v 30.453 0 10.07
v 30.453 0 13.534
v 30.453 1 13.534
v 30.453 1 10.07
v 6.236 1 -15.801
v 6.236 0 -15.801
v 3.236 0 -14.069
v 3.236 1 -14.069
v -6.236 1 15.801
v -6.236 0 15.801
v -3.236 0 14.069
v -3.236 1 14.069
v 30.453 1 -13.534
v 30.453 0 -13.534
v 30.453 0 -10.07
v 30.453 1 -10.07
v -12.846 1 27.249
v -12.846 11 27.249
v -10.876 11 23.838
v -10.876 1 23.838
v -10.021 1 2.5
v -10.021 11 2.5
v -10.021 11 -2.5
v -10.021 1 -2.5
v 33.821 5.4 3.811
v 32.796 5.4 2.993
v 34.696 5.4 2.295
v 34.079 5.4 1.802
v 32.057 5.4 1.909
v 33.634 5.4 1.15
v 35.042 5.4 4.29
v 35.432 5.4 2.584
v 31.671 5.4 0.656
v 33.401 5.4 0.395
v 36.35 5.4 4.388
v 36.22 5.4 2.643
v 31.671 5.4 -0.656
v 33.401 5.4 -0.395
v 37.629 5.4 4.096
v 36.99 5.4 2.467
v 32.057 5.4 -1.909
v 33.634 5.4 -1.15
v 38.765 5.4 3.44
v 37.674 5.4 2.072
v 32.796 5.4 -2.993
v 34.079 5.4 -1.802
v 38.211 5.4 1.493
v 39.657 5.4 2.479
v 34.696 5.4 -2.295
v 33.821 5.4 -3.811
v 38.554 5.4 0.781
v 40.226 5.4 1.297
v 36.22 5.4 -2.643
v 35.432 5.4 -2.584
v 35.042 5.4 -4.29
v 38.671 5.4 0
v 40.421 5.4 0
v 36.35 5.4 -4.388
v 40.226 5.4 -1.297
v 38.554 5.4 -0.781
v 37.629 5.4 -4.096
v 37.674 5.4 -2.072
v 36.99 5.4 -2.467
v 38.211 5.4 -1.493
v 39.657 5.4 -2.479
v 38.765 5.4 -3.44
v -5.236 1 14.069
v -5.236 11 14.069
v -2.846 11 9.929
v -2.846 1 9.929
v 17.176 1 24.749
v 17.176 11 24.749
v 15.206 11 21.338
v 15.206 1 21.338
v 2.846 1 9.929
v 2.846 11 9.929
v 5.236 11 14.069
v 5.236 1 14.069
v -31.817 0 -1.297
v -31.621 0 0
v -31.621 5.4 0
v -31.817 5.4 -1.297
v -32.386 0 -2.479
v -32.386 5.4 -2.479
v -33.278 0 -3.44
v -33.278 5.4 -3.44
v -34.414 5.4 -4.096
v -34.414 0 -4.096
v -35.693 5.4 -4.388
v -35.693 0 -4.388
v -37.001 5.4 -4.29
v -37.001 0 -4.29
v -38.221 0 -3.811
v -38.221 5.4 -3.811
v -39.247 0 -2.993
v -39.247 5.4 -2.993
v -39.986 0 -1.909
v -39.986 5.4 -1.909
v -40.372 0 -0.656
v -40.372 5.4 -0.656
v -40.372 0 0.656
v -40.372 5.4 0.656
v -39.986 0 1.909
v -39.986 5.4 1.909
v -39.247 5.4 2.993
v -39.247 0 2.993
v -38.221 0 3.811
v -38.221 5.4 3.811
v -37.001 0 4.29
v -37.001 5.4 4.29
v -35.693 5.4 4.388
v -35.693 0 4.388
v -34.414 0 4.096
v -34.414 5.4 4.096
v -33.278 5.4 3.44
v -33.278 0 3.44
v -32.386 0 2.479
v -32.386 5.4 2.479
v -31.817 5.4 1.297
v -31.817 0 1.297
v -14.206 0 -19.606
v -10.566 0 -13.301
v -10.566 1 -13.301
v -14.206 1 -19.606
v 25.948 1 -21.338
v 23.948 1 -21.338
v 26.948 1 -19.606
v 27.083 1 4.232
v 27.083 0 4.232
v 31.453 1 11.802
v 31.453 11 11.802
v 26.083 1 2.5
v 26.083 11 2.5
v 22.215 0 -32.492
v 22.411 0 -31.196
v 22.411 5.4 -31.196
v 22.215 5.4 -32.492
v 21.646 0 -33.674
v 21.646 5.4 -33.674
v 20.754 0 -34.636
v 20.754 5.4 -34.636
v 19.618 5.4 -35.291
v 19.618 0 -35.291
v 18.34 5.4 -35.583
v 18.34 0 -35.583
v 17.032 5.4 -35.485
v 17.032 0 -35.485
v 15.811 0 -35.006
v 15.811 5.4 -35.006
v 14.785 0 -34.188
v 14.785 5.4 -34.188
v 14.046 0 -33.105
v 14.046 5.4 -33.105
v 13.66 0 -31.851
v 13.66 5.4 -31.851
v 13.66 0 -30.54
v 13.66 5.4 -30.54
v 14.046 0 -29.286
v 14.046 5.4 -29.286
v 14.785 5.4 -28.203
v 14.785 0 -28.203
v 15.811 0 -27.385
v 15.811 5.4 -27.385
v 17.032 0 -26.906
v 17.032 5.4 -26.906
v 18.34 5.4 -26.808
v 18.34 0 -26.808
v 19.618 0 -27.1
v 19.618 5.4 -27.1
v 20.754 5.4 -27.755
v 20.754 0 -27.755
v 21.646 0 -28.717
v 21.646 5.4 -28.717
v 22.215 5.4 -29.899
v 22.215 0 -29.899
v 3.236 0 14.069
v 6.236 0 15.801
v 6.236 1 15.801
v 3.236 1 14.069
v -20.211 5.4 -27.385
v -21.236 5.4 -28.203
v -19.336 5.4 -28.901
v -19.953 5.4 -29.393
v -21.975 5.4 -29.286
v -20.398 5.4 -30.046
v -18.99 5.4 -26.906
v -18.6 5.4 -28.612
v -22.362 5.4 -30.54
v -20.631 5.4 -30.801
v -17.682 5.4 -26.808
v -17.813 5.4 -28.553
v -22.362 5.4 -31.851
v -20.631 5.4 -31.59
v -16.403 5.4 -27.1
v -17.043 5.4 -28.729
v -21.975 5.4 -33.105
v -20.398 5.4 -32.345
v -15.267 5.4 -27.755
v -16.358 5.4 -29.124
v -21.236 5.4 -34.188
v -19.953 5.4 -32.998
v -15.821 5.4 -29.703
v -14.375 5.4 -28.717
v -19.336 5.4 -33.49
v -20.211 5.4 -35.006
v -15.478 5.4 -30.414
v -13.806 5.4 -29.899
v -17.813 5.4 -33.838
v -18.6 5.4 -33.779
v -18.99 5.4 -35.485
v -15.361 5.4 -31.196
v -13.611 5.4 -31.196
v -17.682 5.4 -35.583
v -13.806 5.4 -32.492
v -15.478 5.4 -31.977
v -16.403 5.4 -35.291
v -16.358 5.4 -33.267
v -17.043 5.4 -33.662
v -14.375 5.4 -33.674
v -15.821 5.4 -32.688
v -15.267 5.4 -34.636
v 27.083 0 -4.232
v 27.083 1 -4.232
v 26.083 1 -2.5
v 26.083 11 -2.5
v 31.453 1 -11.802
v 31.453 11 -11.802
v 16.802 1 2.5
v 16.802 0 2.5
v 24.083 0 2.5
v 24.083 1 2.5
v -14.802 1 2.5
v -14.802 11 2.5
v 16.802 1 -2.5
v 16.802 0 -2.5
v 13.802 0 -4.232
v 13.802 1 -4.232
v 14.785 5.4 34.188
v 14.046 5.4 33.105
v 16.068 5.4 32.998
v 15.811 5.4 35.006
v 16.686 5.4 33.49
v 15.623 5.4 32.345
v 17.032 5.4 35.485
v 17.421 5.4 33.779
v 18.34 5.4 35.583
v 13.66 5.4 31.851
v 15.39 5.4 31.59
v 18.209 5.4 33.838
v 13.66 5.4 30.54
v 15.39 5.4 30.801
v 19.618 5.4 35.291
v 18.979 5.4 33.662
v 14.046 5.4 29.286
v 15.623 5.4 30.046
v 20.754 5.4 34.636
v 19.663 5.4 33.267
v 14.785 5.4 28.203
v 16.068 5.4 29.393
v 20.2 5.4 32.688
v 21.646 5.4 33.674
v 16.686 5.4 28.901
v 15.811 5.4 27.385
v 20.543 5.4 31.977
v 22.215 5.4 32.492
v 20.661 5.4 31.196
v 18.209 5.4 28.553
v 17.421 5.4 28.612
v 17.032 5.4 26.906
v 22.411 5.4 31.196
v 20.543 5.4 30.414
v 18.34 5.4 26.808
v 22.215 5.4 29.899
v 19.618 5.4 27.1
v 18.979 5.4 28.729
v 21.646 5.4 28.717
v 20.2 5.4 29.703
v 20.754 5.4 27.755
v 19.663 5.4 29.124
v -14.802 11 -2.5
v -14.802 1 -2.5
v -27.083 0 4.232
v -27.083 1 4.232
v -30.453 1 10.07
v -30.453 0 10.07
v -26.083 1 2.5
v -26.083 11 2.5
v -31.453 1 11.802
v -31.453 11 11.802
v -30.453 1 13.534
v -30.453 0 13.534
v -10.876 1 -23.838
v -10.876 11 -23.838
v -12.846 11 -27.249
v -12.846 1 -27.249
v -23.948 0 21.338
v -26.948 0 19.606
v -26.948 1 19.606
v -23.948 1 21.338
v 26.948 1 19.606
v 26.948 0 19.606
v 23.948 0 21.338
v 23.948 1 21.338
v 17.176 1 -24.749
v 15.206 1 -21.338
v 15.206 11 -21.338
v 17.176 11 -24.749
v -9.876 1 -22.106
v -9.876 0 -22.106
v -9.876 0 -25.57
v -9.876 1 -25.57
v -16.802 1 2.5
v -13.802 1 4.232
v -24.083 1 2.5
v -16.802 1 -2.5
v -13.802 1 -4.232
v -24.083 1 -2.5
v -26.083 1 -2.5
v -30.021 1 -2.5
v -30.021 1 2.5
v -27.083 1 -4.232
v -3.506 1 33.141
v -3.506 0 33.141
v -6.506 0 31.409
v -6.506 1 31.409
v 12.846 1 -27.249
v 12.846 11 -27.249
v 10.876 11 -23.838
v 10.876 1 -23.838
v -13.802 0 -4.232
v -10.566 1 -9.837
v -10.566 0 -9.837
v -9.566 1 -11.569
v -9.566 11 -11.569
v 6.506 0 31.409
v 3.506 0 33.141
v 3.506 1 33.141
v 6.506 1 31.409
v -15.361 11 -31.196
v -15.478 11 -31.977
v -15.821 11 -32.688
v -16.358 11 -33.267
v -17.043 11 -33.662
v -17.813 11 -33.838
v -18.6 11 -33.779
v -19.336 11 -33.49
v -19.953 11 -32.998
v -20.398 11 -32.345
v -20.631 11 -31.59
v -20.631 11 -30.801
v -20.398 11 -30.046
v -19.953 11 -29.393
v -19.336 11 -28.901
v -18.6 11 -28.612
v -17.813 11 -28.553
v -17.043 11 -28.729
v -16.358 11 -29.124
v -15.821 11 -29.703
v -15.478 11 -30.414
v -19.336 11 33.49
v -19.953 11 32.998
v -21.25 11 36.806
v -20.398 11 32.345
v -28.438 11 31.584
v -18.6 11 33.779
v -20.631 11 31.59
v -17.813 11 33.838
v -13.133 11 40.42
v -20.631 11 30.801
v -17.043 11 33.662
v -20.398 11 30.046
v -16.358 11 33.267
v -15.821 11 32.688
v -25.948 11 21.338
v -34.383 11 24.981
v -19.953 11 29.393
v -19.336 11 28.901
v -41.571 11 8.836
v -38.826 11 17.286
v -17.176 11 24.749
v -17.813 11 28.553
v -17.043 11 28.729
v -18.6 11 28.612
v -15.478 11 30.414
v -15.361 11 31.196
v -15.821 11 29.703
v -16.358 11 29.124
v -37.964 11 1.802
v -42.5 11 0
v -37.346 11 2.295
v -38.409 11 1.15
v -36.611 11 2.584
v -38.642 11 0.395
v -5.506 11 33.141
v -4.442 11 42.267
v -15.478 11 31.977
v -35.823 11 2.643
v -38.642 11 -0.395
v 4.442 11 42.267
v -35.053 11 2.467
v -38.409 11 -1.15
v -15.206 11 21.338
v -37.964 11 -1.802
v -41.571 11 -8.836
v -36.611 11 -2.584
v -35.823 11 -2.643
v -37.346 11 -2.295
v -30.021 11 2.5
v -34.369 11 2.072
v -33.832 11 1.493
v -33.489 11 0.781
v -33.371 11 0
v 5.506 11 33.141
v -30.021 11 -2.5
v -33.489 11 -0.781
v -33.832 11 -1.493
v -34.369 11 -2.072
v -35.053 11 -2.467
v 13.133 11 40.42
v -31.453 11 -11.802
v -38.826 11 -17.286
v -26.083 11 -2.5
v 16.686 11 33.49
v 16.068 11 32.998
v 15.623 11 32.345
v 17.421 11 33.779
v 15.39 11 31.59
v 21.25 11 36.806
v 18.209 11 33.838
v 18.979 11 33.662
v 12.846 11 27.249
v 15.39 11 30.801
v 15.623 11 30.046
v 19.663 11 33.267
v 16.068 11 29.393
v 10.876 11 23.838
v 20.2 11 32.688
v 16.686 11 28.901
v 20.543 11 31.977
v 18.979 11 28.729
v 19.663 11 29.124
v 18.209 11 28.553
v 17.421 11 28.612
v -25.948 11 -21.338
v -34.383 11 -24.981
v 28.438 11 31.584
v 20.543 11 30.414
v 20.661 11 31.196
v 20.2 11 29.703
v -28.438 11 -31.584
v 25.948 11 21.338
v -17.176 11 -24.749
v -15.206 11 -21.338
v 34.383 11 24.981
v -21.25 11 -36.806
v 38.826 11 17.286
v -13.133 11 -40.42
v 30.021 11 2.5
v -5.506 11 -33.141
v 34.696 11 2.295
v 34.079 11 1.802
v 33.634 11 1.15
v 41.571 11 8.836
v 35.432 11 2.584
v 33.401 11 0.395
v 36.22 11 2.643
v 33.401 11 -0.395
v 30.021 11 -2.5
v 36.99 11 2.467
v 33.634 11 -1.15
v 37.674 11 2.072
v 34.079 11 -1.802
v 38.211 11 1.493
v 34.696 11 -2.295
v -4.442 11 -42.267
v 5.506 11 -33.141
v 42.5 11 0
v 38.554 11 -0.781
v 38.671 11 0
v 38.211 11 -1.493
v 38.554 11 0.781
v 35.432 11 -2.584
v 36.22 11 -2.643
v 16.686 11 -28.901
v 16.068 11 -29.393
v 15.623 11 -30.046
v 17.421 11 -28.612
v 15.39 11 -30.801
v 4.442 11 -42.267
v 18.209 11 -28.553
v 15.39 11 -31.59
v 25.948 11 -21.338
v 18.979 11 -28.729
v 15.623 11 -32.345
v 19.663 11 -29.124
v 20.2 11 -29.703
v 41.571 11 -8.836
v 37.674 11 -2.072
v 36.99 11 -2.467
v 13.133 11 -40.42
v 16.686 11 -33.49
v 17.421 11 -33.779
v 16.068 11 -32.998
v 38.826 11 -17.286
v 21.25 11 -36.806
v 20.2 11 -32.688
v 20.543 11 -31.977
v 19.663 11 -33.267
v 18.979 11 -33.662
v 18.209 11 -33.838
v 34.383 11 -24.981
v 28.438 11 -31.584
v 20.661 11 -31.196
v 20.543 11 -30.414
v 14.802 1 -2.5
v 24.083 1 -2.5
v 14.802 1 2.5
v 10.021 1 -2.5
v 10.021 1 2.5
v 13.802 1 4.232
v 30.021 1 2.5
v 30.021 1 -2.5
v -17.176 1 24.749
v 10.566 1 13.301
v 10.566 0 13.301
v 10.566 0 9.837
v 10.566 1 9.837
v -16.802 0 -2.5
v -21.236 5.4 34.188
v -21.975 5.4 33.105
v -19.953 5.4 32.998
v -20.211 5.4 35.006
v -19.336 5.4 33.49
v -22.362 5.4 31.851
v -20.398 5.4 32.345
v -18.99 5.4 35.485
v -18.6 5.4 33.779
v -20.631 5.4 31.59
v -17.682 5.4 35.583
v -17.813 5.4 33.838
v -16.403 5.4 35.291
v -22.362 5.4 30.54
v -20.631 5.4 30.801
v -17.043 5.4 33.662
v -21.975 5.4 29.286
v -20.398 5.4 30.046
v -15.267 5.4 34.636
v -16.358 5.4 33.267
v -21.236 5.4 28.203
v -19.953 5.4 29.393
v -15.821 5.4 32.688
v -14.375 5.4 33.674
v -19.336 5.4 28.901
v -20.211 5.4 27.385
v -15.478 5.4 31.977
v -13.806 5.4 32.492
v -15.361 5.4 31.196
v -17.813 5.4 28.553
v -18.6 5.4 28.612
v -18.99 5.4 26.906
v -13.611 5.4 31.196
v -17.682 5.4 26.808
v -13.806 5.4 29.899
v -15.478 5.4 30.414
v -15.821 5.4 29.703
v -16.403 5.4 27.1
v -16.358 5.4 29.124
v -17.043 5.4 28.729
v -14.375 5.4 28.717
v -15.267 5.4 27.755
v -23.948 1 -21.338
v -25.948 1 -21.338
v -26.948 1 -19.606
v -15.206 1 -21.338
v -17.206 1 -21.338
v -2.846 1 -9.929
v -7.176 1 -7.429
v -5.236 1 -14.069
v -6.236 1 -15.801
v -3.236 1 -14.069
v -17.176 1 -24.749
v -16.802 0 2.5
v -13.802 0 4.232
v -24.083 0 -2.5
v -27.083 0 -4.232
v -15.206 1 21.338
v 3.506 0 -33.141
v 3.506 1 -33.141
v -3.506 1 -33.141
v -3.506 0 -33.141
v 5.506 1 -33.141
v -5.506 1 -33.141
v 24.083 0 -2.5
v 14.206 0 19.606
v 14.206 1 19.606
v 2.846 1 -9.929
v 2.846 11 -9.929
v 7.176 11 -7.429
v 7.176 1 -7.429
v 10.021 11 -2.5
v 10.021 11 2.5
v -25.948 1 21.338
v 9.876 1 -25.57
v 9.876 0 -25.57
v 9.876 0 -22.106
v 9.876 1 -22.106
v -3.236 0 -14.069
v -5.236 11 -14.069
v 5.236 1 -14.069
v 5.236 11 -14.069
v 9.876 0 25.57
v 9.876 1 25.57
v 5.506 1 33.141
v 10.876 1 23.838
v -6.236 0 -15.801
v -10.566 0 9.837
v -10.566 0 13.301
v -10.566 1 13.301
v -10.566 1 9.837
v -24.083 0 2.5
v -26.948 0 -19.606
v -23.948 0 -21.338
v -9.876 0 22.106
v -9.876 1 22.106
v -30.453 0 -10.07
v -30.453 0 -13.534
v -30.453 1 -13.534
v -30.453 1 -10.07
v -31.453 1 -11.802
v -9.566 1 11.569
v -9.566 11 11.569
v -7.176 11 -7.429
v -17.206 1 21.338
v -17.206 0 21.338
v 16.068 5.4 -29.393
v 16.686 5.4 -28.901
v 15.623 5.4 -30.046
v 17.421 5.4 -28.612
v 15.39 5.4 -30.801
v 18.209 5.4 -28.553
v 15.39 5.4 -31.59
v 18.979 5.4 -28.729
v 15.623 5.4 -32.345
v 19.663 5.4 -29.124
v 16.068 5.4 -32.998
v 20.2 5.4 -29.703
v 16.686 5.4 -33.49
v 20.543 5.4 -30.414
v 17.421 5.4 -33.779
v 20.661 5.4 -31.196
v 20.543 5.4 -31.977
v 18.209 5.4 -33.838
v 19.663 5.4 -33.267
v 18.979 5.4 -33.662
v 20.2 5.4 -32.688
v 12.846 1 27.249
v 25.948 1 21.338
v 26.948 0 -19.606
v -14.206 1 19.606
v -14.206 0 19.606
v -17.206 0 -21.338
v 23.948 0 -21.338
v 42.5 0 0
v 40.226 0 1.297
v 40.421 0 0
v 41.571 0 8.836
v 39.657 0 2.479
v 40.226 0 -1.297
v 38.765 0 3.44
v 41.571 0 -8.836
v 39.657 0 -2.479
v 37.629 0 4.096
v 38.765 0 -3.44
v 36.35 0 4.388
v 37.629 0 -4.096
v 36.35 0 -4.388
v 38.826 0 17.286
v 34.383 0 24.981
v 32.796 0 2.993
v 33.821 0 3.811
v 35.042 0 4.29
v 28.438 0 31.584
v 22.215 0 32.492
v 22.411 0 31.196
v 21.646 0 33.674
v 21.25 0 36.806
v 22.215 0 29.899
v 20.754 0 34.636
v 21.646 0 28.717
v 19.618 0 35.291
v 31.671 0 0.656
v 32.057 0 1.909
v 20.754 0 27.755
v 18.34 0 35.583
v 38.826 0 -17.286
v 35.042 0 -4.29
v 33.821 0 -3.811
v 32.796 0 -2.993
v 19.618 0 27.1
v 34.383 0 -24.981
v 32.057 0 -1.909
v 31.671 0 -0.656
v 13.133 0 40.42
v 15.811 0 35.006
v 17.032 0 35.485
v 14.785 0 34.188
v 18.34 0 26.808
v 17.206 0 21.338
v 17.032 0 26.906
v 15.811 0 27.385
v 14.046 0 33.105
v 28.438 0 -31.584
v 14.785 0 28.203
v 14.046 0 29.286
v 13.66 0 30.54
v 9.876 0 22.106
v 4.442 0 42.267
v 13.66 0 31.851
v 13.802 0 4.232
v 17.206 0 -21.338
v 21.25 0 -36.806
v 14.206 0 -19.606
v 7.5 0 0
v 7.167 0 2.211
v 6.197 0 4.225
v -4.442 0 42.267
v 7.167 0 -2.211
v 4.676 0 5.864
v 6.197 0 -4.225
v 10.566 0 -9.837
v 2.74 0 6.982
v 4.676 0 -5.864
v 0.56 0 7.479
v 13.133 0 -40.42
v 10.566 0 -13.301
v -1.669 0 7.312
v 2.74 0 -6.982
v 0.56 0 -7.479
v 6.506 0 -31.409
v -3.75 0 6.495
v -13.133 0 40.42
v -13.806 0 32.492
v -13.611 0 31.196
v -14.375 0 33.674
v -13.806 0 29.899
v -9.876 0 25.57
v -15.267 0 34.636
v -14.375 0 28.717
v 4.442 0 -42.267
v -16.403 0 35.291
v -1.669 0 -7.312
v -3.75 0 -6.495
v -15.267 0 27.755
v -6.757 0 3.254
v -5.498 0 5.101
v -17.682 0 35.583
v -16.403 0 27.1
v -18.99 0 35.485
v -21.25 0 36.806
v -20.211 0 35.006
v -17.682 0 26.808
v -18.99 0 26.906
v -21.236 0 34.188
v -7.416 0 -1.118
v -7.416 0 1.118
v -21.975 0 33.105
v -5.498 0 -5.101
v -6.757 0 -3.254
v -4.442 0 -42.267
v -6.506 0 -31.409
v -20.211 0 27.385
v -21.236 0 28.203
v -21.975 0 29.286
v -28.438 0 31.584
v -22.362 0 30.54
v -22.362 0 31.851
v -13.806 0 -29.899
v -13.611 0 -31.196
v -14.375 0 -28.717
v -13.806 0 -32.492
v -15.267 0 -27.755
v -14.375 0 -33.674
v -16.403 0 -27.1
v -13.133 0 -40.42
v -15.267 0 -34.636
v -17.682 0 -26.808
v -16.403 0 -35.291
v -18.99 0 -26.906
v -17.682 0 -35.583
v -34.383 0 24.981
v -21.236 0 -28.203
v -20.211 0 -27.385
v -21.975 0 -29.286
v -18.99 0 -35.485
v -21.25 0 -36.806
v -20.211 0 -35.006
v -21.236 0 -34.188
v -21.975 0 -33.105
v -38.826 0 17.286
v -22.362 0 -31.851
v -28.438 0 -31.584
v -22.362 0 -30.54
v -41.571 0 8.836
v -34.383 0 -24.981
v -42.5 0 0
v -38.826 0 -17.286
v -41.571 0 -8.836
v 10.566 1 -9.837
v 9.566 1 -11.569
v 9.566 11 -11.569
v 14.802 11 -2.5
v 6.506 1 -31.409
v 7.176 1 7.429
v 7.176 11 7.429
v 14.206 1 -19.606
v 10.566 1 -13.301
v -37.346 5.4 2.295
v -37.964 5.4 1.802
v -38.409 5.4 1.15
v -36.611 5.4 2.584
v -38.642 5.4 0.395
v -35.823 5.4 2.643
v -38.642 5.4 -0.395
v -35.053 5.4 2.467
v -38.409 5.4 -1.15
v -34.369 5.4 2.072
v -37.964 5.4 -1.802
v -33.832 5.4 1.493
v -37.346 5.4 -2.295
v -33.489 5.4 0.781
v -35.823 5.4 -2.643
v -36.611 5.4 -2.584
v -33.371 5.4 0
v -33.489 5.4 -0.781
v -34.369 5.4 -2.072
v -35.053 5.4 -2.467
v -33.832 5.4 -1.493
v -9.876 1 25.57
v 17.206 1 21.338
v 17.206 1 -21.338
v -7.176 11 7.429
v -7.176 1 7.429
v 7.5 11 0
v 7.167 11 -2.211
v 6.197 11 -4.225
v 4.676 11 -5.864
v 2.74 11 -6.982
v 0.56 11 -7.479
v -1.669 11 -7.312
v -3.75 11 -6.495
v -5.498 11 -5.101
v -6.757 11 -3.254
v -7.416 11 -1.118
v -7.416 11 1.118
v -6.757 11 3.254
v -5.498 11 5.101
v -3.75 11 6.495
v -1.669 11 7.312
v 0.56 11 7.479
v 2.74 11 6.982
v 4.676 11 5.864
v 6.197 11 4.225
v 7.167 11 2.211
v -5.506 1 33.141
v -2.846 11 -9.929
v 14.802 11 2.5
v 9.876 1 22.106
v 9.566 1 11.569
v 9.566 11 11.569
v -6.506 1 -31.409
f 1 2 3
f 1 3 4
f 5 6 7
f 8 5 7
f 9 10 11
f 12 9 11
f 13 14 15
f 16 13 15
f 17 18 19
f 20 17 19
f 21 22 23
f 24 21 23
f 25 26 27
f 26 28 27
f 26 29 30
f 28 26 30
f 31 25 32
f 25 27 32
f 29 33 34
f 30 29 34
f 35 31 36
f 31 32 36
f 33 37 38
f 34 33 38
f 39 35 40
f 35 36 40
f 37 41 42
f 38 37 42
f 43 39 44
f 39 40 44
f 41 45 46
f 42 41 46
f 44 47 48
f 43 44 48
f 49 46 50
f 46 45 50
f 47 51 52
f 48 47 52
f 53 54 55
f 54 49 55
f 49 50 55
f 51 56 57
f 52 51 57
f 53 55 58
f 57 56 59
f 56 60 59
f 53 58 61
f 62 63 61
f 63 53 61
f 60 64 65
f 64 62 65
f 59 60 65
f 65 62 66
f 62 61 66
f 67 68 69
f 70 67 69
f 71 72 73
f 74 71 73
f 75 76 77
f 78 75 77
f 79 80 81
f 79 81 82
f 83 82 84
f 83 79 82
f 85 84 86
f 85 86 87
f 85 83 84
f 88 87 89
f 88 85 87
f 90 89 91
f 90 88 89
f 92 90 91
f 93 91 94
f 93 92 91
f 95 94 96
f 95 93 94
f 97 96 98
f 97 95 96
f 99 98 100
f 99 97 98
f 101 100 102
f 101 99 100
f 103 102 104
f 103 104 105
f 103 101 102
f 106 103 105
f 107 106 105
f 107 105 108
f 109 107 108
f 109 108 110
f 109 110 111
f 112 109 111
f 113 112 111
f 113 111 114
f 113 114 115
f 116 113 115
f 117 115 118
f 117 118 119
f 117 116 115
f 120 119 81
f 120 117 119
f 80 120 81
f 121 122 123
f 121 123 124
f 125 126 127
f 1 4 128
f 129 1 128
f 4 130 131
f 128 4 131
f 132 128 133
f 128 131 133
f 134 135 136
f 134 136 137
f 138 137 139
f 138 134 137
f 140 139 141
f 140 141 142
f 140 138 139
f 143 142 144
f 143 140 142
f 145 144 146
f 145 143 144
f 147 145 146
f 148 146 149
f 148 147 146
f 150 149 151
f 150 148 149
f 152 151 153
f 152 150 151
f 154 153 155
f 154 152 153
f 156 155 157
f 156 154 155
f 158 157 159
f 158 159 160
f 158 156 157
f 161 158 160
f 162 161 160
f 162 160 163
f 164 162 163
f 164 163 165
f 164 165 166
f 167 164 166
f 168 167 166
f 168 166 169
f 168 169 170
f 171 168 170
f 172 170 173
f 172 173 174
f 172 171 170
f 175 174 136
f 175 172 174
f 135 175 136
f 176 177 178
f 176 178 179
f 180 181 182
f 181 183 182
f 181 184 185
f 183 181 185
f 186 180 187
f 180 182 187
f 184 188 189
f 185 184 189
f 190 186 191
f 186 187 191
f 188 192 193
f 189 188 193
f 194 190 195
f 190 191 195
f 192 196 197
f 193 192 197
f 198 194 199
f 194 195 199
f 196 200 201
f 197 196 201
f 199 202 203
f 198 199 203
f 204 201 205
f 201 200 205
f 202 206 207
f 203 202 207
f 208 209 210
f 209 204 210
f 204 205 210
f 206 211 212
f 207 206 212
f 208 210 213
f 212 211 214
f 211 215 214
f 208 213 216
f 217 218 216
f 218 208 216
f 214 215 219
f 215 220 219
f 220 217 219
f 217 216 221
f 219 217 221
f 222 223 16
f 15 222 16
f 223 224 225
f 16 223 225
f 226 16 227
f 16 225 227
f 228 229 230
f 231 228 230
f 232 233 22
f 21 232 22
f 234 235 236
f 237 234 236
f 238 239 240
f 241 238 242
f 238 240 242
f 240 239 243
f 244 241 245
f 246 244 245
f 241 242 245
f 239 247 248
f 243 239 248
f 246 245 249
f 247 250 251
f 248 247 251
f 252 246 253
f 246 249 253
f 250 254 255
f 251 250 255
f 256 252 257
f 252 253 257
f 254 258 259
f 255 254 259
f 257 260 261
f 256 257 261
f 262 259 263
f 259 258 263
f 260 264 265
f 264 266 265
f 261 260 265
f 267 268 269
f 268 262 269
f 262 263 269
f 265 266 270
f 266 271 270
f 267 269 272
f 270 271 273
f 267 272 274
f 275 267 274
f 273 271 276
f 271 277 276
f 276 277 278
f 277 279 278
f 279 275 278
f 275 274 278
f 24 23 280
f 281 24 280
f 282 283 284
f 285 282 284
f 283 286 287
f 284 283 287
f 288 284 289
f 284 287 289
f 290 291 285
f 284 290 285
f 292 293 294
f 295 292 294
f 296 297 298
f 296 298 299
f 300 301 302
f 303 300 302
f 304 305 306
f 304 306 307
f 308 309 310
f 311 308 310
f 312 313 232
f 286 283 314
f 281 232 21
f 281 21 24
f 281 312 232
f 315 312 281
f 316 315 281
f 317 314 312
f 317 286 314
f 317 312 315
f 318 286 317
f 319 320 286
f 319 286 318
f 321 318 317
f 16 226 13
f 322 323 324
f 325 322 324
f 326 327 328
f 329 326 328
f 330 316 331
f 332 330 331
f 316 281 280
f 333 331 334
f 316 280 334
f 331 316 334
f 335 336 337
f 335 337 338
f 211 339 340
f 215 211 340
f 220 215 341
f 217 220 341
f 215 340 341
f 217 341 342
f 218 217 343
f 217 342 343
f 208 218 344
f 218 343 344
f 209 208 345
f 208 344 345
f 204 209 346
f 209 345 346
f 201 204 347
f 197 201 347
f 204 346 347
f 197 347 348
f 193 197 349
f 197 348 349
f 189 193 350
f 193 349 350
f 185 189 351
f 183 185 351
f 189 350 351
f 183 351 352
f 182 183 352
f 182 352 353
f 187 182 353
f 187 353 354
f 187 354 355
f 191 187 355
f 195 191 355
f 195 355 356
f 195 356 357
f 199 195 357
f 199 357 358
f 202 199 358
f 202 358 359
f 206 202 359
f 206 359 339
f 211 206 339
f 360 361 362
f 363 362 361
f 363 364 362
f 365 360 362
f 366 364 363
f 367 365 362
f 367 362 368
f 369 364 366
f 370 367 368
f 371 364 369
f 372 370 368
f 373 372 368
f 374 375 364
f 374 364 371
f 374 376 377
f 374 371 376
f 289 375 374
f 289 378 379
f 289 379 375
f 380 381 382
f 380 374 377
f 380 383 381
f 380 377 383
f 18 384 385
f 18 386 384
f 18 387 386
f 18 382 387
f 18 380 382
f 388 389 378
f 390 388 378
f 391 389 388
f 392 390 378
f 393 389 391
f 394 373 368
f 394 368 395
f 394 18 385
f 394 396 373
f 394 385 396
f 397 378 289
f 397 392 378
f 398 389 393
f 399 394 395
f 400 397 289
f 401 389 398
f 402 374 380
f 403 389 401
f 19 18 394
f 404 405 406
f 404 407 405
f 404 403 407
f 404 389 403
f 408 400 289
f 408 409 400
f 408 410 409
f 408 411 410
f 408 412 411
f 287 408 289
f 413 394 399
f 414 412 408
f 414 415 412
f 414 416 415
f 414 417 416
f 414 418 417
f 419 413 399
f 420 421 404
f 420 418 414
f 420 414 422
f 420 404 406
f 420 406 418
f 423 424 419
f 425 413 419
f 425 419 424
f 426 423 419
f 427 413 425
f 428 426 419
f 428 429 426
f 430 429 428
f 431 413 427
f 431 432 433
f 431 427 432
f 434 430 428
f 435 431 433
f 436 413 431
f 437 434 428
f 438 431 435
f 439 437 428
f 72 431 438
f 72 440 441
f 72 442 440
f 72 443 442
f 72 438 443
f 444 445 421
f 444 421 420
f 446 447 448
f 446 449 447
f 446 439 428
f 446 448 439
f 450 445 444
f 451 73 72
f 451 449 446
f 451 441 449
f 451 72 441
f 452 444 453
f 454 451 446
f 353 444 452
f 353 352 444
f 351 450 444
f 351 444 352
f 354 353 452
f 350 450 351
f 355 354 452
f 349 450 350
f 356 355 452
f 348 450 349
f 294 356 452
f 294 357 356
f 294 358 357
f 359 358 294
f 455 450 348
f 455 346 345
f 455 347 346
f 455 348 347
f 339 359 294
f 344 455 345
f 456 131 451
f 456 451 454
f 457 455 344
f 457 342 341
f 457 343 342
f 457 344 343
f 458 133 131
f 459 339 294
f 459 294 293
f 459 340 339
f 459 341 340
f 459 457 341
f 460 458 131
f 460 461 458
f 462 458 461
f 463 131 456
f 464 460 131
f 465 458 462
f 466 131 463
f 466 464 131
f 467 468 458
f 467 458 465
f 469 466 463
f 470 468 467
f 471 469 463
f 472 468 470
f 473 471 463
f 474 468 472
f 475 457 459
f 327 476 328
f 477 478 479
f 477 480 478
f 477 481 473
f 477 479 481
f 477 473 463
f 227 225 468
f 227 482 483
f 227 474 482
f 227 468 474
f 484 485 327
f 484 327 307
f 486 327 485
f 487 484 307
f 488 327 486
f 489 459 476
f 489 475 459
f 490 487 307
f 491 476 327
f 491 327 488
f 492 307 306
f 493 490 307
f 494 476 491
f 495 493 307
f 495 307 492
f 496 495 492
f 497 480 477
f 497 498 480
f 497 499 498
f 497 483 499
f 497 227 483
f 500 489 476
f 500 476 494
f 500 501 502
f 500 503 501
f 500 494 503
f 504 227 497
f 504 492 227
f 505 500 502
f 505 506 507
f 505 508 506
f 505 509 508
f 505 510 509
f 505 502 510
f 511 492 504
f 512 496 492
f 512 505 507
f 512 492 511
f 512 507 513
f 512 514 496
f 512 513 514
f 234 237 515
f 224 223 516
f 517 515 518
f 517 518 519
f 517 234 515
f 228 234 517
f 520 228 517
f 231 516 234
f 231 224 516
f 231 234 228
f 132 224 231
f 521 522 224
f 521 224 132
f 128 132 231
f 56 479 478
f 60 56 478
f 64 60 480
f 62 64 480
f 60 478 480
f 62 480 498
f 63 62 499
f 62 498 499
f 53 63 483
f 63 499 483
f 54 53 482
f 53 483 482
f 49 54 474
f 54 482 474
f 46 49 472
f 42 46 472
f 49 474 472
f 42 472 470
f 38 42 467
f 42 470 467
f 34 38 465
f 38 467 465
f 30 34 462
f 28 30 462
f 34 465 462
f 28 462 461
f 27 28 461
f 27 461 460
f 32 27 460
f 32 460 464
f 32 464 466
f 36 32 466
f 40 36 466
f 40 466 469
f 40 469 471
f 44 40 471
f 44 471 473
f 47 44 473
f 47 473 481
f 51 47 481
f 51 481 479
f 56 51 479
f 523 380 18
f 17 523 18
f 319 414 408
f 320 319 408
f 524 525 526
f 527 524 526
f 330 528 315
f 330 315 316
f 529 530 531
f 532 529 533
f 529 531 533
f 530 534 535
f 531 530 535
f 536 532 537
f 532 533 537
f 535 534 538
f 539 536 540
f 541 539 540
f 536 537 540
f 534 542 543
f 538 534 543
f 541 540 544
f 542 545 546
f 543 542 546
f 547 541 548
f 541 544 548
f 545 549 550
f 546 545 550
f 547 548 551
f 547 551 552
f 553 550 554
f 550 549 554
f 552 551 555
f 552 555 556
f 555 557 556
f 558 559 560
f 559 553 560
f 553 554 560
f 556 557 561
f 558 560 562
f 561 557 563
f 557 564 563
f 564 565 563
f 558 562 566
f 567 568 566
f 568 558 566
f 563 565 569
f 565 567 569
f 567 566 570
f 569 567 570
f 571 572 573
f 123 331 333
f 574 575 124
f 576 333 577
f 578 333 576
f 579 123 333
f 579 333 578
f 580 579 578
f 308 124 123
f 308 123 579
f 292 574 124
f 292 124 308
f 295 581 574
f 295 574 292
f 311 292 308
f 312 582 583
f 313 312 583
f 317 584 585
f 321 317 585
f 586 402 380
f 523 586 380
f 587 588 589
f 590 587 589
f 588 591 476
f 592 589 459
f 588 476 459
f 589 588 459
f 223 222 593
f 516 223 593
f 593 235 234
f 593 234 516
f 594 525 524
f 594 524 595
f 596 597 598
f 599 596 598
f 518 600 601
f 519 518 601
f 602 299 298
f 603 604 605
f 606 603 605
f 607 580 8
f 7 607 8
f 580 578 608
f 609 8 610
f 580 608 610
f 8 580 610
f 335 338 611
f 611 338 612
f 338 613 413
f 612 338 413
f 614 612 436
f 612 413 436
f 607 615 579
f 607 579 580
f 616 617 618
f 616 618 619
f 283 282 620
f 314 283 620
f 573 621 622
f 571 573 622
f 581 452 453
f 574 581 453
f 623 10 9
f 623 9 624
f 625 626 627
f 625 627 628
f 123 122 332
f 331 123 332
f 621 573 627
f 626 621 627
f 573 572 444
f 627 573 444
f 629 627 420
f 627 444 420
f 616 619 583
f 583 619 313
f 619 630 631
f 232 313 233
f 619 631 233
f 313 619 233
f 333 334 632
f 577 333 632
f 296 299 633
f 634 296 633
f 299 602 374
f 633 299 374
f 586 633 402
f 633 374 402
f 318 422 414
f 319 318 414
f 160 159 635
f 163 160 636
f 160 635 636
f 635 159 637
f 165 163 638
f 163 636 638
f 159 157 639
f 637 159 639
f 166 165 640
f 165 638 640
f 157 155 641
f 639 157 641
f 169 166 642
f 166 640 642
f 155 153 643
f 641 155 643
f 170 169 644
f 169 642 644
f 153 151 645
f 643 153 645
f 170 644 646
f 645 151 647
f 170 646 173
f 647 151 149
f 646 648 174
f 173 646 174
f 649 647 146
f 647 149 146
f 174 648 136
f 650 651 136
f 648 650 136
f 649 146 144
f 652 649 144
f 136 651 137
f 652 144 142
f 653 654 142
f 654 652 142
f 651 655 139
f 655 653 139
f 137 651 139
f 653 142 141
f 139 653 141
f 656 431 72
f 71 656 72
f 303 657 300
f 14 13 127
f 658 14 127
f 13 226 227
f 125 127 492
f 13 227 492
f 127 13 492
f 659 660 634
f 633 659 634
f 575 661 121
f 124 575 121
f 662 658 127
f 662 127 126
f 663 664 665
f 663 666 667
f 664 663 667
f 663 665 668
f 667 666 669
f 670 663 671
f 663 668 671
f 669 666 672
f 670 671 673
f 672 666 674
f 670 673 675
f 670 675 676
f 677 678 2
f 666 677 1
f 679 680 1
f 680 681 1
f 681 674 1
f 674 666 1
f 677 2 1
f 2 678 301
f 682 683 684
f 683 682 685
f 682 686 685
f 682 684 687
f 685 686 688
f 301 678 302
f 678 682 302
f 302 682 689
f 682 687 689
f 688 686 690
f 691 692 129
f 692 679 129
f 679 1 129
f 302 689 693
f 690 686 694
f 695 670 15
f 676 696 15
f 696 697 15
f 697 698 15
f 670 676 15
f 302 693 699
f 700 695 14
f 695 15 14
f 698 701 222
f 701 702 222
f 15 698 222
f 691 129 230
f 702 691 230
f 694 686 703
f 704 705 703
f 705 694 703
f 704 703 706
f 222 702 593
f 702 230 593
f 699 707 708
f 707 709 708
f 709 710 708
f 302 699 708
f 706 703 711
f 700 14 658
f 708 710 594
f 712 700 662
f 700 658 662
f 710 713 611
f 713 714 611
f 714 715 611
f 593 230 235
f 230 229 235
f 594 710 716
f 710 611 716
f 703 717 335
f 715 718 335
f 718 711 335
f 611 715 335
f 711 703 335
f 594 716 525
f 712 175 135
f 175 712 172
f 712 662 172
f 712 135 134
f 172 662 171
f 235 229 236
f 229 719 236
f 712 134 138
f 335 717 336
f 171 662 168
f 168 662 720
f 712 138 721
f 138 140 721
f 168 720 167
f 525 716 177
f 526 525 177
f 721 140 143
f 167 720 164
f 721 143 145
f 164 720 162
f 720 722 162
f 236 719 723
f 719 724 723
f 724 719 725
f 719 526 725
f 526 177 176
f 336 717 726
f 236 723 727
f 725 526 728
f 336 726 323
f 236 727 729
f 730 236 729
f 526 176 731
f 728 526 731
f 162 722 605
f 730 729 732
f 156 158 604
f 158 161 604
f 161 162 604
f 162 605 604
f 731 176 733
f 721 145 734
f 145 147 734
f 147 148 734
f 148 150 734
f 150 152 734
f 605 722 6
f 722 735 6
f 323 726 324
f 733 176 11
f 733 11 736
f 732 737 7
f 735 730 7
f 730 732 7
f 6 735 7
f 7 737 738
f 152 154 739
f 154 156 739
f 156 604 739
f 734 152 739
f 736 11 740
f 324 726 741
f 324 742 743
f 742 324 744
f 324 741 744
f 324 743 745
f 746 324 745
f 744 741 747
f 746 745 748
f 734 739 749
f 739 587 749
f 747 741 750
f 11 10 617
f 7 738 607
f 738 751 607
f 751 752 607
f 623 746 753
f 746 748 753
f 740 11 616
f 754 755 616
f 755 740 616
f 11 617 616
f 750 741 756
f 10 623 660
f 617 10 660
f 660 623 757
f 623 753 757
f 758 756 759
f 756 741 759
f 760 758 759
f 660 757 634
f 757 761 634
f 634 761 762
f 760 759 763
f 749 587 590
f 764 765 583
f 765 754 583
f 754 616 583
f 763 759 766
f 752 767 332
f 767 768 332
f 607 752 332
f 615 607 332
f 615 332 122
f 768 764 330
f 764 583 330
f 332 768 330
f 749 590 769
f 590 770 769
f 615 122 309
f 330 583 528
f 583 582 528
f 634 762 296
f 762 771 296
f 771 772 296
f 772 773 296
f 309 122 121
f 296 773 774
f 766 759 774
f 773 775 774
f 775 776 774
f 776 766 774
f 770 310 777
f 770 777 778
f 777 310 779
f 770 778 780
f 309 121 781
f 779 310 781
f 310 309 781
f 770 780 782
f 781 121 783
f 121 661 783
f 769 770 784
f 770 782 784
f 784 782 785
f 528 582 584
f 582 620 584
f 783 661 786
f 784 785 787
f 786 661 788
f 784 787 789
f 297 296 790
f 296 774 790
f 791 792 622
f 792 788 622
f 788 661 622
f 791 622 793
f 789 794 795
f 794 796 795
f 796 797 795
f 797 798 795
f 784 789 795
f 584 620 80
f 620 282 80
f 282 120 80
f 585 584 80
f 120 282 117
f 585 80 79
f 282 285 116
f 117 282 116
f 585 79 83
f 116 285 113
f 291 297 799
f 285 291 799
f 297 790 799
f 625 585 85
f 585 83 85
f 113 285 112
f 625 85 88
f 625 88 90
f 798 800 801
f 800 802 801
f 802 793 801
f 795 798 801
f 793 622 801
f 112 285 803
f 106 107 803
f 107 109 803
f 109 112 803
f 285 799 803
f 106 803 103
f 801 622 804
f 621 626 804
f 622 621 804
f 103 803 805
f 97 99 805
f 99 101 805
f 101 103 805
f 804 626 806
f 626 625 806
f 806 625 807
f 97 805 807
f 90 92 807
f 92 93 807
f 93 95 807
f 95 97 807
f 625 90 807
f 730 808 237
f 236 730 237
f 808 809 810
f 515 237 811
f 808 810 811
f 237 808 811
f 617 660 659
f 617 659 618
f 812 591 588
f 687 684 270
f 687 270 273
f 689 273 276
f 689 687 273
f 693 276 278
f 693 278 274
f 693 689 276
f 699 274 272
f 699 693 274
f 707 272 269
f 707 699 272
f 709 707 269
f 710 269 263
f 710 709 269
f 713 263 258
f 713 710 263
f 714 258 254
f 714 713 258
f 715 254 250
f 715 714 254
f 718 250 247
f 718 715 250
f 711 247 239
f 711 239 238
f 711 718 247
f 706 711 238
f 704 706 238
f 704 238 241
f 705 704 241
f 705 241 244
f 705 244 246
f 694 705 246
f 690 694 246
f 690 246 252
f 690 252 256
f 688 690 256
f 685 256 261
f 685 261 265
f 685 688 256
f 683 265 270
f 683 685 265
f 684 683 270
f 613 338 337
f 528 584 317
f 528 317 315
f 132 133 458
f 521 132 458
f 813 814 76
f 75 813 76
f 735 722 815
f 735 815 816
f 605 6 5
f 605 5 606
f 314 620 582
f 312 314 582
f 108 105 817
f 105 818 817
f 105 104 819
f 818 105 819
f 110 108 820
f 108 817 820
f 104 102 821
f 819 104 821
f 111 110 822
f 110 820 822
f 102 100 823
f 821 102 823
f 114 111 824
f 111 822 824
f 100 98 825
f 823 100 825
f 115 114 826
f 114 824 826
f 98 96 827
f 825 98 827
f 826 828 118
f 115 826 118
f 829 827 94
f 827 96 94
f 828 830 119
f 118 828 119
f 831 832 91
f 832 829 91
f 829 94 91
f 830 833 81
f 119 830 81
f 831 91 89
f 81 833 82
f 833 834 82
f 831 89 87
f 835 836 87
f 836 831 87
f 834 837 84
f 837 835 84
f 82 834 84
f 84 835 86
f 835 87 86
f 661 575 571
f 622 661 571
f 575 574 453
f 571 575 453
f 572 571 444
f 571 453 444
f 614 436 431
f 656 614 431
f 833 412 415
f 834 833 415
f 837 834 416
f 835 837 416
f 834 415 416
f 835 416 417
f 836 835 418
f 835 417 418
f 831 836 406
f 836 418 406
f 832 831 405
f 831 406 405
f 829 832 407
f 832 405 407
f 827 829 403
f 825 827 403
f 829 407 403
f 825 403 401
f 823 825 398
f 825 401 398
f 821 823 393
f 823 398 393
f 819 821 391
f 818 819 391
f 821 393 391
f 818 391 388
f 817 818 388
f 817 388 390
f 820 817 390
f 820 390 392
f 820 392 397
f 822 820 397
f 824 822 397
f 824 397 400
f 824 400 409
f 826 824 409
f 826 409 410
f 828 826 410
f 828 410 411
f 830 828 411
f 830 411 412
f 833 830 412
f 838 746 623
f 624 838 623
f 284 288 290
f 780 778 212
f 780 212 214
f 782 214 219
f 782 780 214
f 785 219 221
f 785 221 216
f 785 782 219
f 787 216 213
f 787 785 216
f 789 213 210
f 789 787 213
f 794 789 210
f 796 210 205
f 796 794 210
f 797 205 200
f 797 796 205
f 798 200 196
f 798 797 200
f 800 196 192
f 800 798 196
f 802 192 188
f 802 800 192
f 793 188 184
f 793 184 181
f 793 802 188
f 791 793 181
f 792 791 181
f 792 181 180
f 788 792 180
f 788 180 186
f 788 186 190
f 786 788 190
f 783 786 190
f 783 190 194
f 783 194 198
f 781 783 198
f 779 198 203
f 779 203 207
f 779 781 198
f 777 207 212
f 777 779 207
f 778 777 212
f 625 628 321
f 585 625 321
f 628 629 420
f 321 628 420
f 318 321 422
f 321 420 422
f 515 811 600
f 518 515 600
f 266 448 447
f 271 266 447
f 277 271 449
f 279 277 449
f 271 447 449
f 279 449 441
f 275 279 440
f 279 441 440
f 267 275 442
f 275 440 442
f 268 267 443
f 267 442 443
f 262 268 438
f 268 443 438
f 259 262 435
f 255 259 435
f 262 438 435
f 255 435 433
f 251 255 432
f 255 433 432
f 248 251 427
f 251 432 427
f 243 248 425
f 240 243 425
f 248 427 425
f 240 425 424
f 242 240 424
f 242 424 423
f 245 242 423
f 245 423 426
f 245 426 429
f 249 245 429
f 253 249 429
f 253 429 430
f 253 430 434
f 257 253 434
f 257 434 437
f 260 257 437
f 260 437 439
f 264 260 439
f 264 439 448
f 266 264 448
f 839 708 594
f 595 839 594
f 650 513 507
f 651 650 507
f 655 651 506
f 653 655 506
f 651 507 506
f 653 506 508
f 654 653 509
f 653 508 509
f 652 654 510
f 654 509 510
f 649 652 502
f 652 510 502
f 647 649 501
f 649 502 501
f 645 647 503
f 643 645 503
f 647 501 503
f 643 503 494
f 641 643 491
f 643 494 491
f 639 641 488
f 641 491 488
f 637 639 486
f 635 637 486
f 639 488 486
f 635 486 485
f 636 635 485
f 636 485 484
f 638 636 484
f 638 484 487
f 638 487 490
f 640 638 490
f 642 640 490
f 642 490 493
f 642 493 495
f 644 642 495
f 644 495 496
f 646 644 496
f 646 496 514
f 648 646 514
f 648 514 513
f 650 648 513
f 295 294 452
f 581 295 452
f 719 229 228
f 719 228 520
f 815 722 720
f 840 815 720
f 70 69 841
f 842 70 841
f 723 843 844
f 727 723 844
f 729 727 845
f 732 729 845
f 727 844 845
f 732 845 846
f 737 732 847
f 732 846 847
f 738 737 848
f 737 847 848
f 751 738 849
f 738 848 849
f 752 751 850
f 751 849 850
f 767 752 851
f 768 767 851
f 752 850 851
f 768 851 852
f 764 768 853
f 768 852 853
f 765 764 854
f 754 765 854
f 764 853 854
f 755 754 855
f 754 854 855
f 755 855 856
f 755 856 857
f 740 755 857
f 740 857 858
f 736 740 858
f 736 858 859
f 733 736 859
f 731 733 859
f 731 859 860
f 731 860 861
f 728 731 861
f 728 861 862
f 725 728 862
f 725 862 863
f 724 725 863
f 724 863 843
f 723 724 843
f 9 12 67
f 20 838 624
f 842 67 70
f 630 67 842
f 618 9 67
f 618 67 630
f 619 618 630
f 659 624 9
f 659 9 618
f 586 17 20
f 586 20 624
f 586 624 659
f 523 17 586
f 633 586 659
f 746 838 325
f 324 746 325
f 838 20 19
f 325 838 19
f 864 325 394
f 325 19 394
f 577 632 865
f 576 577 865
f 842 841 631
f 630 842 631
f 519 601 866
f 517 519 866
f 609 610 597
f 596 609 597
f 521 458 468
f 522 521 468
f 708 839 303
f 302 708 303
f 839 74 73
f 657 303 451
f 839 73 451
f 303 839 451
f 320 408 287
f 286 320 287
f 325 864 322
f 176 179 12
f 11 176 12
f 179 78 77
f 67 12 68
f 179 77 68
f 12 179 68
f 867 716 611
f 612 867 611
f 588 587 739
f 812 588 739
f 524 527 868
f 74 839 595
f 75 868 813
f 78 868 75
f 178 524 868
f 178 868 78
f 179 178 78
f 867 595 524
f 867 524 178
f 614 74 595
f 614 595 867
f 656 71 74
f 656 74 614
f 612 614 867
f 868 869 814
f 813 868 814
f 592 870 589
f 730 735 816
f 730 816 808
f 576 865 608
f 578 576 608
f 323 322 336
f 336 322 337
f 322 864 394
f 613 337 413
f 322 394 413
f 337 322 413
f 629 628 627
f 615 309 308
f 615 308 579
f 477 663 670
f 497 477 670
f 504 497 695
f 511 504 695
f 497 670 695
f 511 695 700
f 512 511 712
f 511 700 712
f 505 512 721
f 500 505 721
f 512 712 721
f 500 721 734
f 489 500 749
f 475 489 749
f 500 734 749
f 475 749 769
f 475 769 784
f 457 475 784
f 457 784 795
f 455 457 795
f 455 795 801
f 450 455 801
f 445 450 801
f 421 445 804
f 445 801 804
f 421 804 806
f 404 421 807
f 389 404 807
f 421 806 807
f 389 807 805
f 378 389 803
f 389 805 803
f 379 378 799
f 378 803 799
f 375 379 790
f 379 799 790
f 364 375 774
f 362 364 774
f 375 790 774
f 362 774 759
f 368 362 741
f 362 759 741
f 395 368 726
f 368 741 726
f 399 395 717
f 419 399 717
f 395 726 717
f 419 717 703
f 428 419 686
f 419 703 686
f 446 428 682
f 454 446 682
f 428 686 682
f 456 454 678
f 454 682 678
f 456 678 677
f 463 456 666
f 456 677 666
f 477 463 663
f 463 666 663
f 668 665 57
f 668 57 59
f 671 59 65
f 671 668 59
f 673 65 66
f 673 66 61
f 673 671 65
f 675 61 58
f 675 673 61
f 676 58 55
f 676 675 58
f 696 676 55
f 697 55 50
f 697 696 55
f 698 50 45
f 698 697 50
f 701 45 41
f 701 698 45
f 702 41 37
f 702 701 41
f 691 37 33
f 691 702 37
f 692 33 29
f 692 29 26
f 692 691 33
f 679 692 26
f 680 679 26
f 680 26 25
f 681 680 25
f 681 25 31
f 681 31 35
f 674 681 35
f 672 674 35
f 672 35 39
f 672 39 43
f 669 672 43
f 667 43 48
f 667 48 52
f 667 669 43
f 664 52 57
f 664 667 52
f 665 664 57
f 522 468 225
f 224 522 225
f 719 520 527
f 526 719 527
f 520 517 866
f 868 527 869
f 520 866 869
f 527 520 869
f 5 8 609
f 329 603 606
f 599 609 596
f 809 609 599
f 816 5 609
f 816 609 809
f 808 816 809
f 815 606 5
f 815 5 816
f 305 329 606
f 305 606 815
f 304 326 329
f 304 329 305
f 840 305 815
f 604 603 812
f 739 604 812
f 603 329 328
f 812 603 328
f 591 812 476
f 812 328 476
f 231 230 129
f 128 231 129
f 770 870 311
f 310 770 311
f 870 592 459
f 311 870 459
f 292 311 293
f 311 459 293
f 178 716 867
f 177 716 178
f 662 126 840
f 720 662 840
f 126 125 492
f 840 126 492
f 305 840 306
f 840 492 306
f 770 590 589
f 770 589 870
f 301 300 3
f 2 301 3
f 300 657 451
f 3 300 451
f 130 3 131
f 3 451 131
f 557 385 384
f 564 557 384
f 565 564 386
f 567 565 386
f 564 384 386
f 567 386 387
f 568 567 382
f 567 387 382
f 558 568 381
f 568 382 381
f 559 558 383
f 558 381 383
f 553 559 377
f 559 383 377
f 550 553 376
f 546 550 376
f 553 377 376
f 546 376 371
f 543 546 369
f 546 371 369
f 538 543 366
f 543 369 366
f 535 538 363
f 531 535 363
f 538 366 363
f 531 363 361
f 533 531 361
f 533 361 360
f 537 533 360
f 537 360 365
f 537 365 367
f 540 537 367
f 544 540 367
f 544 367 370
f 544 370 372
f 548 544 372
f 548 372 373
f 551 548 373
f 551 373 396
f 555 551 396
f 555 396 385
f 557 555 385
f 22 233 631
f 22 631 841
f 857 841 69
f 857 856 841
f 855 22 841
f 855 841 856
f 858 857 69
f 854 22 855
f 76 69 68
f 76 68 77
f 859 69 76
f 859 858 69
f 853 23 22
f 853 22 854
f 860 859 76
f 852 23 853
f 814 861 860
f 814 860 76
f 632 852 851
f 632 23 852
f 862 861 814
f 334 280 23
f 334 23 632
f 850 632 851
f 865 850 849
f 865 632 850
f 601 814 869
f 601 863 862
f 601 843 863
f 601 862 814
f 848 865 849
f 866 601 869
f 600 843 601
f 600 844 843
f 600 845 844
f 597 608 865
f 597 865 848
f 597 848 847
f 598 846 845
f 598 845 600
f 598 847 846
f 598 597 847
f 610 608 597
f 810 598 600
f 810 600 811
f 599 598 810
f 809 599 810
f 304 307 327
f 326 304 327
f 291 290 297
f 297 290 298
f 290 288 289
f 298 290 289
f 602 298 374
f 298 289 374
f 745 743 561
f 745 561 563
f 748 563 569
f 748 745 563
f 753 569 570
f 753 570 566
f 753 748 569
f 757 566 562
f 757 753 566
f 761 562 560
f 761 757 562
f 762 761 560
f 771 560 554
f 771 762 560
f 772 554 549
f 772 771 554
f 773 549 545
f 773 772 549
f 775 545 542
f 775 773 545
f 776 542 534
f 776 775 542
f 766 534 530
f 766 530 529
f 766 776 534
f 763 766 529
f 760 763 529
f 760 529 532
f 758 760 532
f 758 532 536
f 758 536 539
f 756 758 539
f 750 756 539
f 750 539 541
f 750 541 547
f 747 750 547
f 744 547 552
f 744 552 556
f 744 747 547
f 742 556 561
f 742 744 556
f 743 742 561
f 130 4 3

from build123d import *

# Parameters (mm, degrees)
SKETCH2_R               = 42.5
BOSS_EXTRUDE1_DEPTH     = 11
CUT_EXTRUDE3_DEPTH      = 11
SKETCH4_R               = 2.65
CUT_EXTRUDE4_DEPTH      = 12
SKETCH7_W               = 20
SKETCH7_H               = 5
BOSS_EXTRUDE2_DEPTH     = 1
SKETCH6_R               = 4.4
CUT_EXTRUDE6_DEPTH      = 5.4
SKETCH8_R               = 7.5
CUT_EXTRUDE7_DEPTH      = 1
CUT_EXTRUDE7_DEPTH_BACK = 12
BOSS_EXTRUDE3_DEPTH     = 1
CIRPATTERN1_COUNT       = 6


with BuildPart() as part:
    # Sketch2 → Boss-Extrude1 (new body)
    with BuildSketch(Plane(origin=(0, 0, 0), x_dir=(1, 0, 0), z_dir=(0, 1, 0))):
        Circle(SKETCH2_R)
    extrude(amount=BOSS_EXTRUDE1_DEPTH)

    # Sketch3 → Cut-Extrude3 (cut)
    with BuildSketch(Plane(origin=(0, 11, 0), x_dir=(1, 0, 0), z_dir=(0, 1, 0))):
        Polygon((10.876265015, 23.838243603), (5.505548638, 33.14059724), (-5.505548638, 33.14059724), (-10.876265015, 23.838243602), (-12.845675931, 27.249363369), (-17.175802949, 24.749363369), (-15.206392034, 21.338243603), (-25.947824787, 21.338243602), (-31.453373426, 11.802353637), (-26.082657049, 2.5), (-30.02147888, 2.5), (-30.02147888, -2.5), (-26.082657049, -2.5), (-31.453373426, -11.802353638), (-25.947824787, -21.338243603), (-15.206392034, -21.338243603), (-17.175802949, -24.749363369), (-12.845675931, -27.249363369), (-10.876265015, -23.838243603), (-5.505548638, -33.14059724), (5.505548638, -33.14059724), (10.876265015, -23.838243602), (12.845675931, -27.249363369), (17.175802949, -24.749363369), (15.206392034, -21.338243603), (25.947824787, -21.338243602), (31.453373426, -11.802353637), (26.082657049, -2.5), (30.02147888, -2.5), (30.02147888, 2.5), (26.082657049, 2.5), (31.453373426, 11.802353637), (25.947824787, 21.338243602), (15.206392034, 21.338243602), (17.175802949, 24.749363369), (12.845675931, 27.249363369), align=None)
        Polygon((-5.235884115, 14.06881731), (5.235884115, 14.06881731), (2.845675931, 9.928855294), (7.175802949, 7.428855294), (9.566011134, 11.56881731), (14.801895249, 2.5), (10.02147888, 2.5), (10.02147888, -2.5), (14.801895249, -2.5), (9.566011134, -11.56881731), (7.175802949, -7.428855294), (2.845675931, -9.928855294), (5.235884115, -14.06881731), (-5.235884115, -14.06881731), (-2.845675931, -9.928855294), (-7.175802949, -7.428855294), (-9.566011134, -11.56881731), (-14.801895249, -2.5), (-10.02147888, -2.5), (-10.02147888, 2.5), (-14.801895249, 2.5), (-9.566011134, 11.56881731), (-7.175802949, 7.428855294), (-2.845675931, 9.928855294), align=None, mode=Mode.SUBTRACT)
    extrude(amount=-CUT_EXTRUDE3_DEPTH, mode=Mode.SUBTRACT)

    # Sketch4 → Cut-Extrude4 (cut, through all)
    with BuildSketch(Plane(origin=(0, 11, 0), x_dir=(1, 0, 0), z_dir=(0, 1, 0))):
        with Locations((18.01073944, 31.195515792)):
            Circle(SKETCH4_R)
        with Locations((36.02147888, 0)):
            Circle(SKETCH4_R)
        with Locations((18.01073944, -31.195515792)):
            Circle(SKETCH4_R)
        with Locations((-18.01073944, -31.195515792)):
            Circle(SKETCH4_R)
        with Locations((-36.02147888, 0)):
            Circle(SKETCH4_R)
        with Locations((-18.01073944, 31.195515792)):
            Circle(SKETCH4_R)
    extrude(amount=-CUT_EXTRUDE4_DEPTH, mode=Mode.SUBTRACT)

    # Sketch7 → Boss-Extrude2 (add)
    with BuildSketch(Plane.XZ):
        Polygon((-7.175802949, 7.428855294), (-2.845675931, 9.928855294), (-12.845675931, 27.249363369), (-17.175802949, 24.749363369), align=None)
        Polygon((12.845675931, 27.249363369), (2.845675931, 9.928855294), (7.175802949, 7.428855294), (17.175802949, 24.749363369), align=None)
        with Locations((20.02147888, 0)):
            Rectangle(SKETCH7_W, SKETCH7_H)
        Polygon((17.175802949, -24.749363369), (7.175802949, -7.428855294), (2.845675931, -9.928855294), (12.845675931, -27.249363369), align=None)
        Polygon((-12.845675931, -27.249363369), (-2.845675931, -9.928855294), (-7.175802949, -7.428855294), (-17.175802949, -24.749363369), align=None)
        with Locations((-20.02147888, 0)):
            Rectangle(SKETCH7_W, SKETCH7_H)
    extrude(amount=-BOSS_EXTRUDE2_DEPTH)

    # Sketch6 → Cut-Extrude6 (cut)
    with BuildSketch(Plane(origin=(0, 0, 0), x_dir=(1, 0, 0), z_dir=(0, 1, 0))):
        with Locations((18.01073944, 31.195515792)):
            Circle(SKETCH6_R)
        with Locations((36.02147888, 0)):
            Circle(SKETCH6_R)
        with Locations((18.01073944, -31.195515792)):
            Circle(SKETCH6_R)
        with Locations((-18.01073944, -31.195515792)):
            Circle(SKETCH6_R)
        with Locations((-36.02147888, 0)):
            Circle(SKETCH6_R)
        with Locations((-18.01073944, 31.195515792)):
            Circle(SKETCH6_R)
    extrude(amount=CUT_EXTRUDE6_DEPTH, mode=Mode.SUBTRACT)

    # Sketch8 → Cut-Extrude7 (cut, two sides)
    with BuildSketch(Plane(origin=(0, 11, 0), x_dir=(1, 0, 0), z_dir=(0, 1, 0))) as cut_extrude7_sk:
        Circle(SKETCH8_R)
    extrude(amount=CUT_EXTRUDE7_DEPTH, mode=Mode.SUBTRACT)
    extrude(cut_extrude7_sk.sketch, amount=-CUT_EXTRUDE7_DEPTH_BACK, mode=Mode.SUBTRACT)

    # Sketch11 → Boss-Extrude3 (add)
    with BuildSketch(Plane.XZ):
        Polygon((17.206392034, 21.338243603), (14.206392034, 19.606192795), (15.206392034, 21.338243603), align=None)
        Polygon((25.947824787, 21.338243602), (26.947824787, 19.606192795), (23.947824787, 21.338243603), align=None)
        Polygon((30.453373426, 10.07030283), (31.453373426, 11.802353637), (30.453373426, 13.534404445), align=None)
        Polygon((24.082657049, 2.5), (27.082657049, 4.232050808), (26.082657049, 2.5), align=None)
        Polygon((13.801895249, 4.232050808), (14.801895249, 2.5), (16.801895249, 2.5), align=None)
        Polygon((10.566011134, 9.836766502), (9.566011134, 11.56881731), (10.566011134, 13.300868118), align=None)
    boss_extrude3 = extrude(amount=-BOSS_EXTRUDE3_DEPTH)

    # CirPattern1: Boss-Extrude3 ×6 about axis
    cirpattern1_axis = Axis((0, 0, 0), (0, 1, 0))
    for i in range(1, CIRPATTERN1_COUNT):
        add(boss_extrude3.rotate(cirpattern1_axis, i * 360 / CIRPATTERN1_COUNT))


solid = part.part
